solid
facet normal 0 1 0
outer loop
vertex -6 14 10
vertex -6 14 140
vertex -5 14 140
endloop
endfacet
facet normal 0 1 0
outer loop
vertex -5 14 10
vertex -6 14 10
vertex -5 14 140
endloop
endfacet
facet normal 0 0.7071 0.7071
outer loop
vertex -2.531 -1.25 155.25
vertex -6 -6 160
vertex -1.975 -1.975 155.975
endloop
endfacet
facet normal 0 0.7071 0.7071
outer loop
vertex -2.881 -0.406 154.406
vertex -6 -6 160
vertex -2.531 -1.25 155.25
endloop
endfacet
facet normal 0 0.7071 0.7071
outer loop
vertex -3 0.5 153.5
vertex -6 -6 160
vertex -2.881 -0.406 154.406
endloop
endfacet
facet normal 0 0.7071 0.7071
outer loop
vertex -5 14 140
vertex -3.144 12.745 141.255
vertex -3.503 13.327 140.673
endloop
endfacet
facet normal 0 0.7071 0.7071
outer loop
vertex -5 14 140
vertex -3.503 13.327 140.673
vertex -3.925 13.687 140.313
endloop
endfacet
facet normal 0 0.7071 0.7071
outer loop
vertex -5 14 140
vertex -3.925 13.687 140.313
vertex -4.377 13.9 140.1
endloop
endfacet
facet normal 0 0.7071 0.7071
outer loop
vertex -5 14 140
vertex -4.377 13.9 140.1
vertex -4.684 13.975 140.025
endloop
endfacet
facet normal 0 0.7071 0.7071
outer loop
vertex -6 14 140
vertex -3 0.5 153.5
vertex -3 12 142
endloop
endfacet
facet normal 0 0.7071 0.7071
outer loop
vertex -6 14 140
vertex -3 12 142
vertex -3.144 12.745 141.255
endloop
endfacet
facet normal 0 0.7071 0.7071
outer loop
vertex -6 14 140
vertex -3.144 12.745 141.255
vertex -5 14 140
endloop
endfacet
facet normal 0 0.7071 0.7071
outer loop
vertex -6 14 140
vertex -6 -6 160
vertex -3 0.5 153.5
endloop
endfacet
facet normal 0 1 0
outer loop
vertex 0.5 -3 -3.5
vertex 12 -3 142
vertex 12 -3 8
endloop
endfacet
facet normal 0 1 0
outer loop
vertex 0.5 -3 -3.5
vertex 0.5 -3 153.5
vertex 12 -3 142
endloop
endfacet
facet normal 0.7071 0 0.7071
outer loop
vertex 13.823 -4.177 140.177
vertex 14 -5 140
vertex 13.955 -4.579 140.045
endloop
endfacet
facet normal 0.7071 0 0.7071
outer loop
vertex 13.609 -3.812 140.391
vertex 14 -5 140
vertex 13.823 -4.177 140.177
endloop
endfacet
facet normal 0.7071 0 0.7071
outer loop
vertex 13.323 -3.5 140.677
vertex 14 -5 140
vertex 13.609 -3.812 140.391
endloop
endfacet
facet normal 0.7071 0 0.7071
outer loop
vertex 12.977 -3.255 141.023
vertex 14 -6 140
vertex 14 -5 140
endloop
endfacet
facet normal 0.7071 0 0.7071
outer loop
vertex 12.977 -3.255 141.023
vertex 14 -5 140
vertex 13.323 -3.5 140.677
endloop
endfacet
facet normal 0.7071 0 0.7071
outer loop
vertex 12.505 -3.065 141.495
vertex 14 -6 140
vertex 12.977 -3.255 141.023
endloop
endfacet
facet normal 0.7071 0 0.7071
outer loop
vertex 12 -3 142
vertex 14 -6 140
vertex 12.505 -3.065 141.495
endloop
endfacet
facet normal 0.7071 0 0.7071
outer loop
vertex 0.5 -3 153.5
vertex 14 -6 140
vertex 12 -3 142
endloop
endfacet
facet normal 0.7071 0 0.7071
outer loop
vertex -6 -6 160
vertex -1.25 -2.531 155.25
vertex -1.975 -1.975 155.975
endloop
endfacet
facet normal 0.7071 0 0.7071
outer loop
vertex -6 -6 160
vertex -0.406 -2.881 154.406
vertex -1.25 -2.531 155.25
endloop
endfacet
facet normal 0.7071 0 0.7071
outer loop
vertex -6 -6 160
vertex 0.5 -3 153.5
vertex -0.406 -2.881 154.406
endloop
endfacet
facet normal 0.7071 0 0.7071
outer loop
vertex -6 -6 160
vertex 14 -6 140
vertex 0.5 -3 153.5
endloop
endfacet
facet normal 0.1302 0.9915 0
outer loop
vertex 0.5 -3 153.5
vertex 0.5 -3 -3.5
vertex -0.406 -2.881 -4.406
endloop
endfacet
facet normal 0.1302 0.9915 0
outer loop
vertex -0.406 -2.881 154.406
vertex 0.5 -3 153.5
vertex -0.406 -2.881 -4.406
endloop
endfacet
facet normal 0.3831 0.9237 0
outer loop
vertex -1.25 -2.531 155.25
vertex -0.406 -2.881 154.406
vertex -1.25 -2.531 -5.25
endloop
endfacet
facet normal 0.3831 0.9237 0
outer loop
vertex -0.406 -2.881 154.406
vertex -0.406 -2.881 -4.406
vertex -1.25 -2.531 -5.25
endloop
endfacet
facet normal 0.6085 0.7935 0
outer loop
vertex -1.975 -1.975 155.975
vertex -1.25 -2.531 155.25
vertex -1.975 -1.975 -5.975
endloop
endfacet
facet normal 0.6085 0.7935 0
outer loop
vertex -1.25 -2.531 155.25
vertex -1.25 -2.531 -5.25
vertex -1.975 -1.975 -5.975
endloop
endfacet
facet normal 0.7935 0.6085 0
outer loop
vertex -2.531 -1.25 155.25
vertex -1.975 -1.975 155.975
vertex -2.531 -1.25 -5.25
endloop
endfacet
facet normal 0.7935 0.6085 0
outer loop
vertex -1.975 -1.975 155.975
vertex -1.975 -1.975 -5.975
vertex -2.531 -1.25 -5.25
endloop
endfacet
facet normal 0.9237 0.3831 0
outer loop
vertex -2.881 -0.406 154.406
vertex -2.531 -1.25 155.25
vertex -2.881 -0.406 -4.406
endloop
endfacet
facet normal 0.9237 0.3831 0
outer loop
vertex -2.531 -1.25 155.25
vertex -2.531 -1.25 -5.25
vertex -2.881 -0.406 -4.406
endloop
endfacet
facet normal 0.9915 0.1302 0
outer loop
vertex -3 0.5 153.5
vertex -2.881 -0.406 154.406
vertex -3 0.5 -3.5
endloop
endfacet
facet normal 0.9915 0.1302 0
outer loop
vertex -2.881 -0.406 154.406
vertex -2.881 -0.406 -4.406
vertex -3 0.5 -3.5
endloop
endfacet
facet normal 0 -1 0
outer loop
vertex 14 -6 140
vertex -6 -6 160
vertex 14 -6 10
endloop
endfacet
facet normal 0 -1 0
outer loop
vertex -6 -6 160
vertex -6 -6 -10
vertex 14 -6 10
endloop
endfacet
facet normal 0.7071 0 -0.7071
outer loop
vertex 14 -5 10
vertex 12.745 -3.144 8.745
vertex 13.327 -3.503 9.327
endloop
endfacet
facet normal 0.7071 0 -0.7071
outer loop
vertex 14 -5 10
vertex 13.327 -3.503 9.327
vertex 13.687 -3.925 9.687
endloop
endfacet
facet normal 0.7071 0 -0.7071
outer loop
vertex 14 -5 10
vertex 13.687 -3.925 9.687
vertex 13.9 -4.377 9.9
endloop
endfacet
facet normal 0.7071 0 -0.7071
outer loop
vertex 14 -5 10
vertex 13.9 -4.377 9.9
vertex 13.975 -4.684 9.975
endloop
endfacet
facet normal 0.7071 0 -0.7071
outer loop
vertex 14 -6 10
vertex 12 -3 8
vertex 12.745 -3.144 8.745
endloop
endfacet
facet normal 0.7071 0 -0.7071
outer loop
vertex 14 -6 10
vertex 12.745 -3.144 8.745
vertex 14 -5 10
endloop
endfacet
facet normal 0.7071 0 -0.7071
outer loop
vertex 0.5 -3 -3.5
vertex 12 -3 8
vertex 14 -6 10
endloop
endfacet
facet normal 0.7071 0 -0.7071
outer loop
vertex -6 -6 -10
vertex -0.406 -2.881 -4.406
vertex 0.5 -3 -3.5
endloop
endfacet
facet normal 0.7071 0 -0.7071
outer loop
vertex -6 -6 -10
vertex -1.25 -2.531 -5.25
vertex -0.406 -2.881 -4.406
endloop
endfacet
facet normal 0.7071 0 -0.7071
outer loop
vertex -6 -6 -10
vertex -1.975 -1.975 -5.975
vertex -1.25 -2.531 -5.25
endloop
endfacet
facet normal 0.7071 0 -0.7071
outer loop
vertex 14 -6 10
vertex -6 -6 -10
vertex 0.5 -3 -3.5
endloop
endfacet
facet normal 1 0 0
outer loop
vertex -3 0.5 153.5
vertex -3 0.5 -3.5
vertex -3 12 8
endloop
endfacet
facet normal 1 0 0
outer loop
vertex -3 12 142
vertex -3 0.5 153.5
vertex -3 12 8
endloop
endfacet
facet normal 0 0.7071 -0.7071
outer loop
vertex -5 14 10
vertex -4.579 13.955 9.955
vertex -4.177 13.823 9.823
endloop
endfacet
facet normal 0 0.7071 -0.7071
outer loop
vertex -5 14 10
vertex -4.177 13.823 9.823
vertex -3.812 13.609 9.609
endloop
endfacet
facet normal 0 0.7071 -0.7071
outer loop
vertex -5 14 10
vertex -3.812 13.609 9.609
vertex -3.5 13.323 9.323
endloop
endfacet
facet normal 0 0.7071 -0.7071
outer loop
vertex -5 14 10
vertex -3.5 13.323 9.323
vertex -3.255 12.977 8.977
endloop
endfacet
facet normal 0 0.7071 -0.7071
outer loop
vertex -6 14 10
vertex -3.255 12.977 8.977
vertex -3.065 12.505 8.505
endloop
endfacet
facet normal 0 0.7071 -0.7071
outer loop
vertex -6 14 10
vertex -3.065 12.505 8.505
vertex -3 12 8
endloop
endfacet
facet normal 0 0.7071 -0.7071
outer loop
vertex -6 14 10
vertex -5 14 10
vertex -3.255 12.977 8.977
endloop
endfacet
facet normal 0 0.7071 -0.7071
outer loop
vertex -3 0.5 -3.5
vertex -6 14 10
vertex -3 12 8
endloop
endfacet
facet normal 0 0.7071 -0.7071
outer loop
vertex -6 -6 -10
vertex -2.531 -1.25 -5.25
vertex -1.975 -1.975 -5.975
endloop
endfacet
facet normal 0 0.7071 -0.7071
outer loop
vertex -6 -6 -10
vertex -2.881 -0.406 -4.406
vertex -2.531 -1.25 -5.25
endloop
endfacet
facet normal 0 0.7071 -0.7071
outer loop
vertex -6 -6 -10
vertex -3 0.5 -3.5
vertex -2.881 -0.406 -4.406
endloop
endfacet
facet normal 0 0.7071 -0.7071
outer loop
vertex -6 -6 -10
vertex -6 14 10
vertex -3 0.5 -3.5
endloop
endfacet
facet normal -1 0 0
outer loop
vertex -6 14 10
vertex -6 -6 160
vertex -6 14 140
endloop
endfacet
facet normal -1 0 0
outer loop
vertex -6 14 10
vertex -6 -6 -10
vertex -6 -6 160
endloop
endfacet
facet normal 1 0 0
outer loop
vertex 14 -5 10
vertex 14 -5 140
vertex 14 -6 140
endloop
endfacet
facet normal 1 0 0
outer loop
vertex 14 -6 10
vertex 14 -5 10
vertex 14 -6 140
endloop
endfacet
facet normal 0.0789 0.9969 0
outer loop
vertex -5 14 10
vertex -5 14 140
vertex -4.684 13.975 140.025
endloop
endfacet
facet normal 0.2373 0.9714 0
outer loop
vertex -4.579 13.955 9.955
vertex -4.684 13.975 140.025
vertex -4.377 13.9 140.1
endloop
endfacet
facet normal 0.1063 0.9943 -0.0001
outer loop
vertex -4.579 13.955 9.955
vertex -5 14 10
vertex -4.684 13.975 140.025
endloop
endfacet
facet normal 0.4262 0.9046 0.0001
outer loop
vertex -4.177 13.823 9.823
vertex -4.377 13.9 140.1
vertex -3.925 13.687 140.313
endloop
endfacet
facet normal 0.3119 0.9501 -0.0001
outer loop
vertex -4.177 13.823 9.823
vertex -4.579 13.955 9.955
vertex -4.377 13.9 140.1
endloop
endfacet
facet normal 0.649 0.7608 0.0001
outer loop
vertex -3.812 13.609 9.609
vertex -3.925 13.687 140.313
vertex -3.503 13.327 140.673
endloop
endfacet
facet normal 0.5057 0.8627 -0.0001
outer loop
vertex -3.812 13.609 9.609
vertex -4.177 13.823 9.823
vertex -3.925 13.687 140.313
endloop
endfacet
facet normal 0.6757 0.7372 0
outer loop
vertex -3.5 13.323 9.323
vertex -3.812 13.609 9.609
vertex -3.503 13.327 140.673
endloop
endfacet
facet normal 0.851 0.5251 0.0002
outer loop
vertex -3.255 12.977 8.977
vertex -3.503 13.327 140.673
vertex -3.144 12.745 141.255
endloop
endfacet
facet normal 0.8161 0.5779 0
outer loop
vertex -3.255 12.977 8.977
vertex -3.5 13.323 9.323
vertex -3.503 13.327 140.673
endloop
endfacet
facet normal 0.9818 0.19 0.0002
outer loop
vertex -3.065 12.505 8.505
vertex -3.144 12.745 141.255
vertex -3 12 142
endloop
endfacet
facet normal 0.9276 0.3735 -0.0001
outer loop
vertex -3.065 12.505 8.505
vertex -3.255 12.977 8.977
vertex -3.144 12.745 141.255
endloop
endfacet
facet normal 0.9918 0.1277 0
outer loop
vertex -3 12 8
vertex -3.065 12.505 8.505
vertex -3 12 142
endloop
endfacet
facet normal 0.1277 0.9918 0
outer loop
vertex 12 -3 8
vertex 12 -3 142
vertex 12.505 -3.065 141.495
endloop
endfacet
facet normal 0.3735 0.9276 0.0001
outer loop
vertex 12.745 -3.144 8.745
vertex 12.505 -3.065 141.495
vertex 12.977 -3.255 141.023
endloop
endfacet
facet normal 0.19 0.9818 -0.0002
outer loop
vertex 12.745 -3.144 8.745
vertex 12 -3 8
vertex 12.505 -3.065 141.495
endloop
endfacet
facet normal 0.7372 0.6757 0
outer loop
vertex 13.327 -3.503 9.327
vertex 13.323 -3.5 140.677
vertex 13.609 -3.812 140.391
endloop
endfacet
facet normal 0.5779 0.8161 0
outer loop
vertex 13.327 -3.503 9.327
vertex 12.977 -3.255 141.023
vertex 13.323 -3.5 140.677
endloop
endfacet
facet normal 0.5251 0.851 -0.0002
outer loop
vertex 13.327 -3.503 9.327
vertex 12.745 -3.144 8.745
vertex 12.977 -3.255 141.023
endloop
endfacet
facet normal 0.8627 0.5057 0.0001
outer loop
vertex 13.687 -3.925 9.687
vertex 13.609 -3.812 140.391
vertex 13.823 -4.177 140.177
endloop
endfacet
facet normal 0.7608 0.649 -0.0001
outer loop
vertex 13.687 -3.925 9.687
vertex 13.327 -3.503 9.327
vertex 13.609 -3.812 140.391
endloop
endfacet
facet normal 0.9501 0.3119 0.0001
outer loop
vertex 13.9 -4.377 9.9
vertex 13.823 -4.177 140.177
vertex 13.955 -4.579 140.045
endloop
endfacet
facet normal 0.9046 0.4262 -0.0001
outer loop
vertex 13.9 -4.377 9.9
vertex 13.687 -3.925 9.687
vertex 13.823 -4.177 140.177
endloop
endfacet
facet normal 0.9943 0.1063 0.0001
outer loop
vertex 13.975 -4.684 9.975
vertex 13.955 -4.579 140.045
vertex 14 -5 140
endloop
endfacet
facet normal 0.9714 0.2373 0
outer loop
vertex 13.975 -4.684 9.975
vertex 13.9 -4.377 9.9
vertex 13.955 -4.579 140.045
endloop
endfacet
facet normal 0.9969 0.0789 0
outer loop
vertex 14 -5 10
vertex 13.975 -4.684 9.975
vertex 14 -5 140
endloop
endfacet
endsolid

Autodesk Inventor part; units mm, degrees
ref_plane "Start plane" through (0, 0, -10) normal (0, 0, 1) x (1, 0, 0)
ref_plane "End plane" through (0, 0, 160) normal (0, 0, 1) x (1, 0, 0)
sketch "Sketch" plane through (0, 0, 0) normal (0, 0, 1) x (1, 0, 0)
  line L0 (-3, 0.5) -> (-3, 12)
  line L1 (-6, 14) -> (-5, 14)
  line L2 (-6, -6) -> (-6, 14)
  line L3 (-6, -6) -> (14, -6)
  line L4 (14, -5) -> (14, -6)
  line L5 (0.5, -3) -> (12, -3)
  arc A0 (-3, 0.5) -> (0.5, -3) centre (0.5, 0.5) ccw
  arc A1 (-3, 12) -> (-5, 14) centre (-5, 12) ccw
  arc A2 (14, -5) -> (12, -3) centre (12, -5) ccw
  line L6 (0, 18.4971) -> (0, -10.0828) construction
  line L7 (-10.0828, 0) -> (18.4971, 0) construction
  point P0 (-3, -3)
  point P1 (-3, 14)
  point P2 (14, -3)
  dimension "d4" = 20
  dimension "d6" = 20
  dimension "d8" = 3
  dimension "d10" = 3
  dimension "d17" = 3.5
  dimension "d18" = 2
  dimension "d19" = 6
  dimension "d20" = 6
extrude "Body" add sketch "Sketch" along normal up to surface (170 mm away) from surface at -10
sketch "Sketch3" plane through (0, 0, 0) normal (0, 0, 1) x (1, 0, 0)
  line L0 (0, 0) -> (10, 0)
ref_plane "Work Plane10" through (0, 0, 0) normal (0, -1, 0) x (1, 0, 0)
sketch "Sketch4" plane through (0, 0, 0) normal (0, -1, 0) x (1, 0, 0)
  line L0 (-2, -10) -> (12, -10)
  line L1 (-2, 160) -> (12, 160)
  dimension "d24" = 170
ref_plane "Work Plane11" through (-6, 4, 160) normal (0.7071, 0, 0.7071) x (0.7071, 0, -0.7071)
split "Split1" plane through (-6, 4, 160) removes the side toward (0.7071, 0, 0.7071)
ref_plane "Work Plane12" through (-6, 4, -10) normal (0.7071, 0, -0.7071) x (-0.7071, 0, -0.7071)
split "Split2" plane through (-6, 4, -10) removes the side toward (0.7071, 0, -0.7071)
ref_plane "Work Plane13" through (4, -6, -10) normal (0, 0.7071, -0.7071) x (1, 0, 0)
split "Split3" plane through (4, -6, -10) removes the side toward (0, 0.7071, -0.7071)
ref_plane "Work Plane14" through (4, -6, 160) normal (0, 0.7071, 0.7071) x (1, 0, 0)
split "Split4" plane through (4, -6, 160) removes the side toward (0, 0.7071, 0.7071)
equation "\"d4\" = b"
equation "\"d6\" = b"
equation "\"d8\" = ParT"
equation "\"d10\" = ParT"
equation "\"d17\" = R"
equation "\"d18\" = R1"
equation "\"d19\" = ex"
equation "\"d20\" = d19"
equation "\"d11\" = G_L"
equation "\"b\" = 20"
equation "\"ParT\" = 3"
equation "\"R\" = 3.5"
equation "\"R1\" = 2"
equation "\"G_L\" = d24"
equation "\"ex\" = 6"
equation "\"G_OFFSET_START\" = 10"
equation "\"G_OFFSET_END\" = 10"
equation "\"d21\" = -G_OFFSET_START"
equation "\"d22\" = G_OFFSET_END + B_L"
equation "\"B_L\" = 150"
properties part number "ISO 657-1 - L20x20x3-170" material "Stainless Steel"
